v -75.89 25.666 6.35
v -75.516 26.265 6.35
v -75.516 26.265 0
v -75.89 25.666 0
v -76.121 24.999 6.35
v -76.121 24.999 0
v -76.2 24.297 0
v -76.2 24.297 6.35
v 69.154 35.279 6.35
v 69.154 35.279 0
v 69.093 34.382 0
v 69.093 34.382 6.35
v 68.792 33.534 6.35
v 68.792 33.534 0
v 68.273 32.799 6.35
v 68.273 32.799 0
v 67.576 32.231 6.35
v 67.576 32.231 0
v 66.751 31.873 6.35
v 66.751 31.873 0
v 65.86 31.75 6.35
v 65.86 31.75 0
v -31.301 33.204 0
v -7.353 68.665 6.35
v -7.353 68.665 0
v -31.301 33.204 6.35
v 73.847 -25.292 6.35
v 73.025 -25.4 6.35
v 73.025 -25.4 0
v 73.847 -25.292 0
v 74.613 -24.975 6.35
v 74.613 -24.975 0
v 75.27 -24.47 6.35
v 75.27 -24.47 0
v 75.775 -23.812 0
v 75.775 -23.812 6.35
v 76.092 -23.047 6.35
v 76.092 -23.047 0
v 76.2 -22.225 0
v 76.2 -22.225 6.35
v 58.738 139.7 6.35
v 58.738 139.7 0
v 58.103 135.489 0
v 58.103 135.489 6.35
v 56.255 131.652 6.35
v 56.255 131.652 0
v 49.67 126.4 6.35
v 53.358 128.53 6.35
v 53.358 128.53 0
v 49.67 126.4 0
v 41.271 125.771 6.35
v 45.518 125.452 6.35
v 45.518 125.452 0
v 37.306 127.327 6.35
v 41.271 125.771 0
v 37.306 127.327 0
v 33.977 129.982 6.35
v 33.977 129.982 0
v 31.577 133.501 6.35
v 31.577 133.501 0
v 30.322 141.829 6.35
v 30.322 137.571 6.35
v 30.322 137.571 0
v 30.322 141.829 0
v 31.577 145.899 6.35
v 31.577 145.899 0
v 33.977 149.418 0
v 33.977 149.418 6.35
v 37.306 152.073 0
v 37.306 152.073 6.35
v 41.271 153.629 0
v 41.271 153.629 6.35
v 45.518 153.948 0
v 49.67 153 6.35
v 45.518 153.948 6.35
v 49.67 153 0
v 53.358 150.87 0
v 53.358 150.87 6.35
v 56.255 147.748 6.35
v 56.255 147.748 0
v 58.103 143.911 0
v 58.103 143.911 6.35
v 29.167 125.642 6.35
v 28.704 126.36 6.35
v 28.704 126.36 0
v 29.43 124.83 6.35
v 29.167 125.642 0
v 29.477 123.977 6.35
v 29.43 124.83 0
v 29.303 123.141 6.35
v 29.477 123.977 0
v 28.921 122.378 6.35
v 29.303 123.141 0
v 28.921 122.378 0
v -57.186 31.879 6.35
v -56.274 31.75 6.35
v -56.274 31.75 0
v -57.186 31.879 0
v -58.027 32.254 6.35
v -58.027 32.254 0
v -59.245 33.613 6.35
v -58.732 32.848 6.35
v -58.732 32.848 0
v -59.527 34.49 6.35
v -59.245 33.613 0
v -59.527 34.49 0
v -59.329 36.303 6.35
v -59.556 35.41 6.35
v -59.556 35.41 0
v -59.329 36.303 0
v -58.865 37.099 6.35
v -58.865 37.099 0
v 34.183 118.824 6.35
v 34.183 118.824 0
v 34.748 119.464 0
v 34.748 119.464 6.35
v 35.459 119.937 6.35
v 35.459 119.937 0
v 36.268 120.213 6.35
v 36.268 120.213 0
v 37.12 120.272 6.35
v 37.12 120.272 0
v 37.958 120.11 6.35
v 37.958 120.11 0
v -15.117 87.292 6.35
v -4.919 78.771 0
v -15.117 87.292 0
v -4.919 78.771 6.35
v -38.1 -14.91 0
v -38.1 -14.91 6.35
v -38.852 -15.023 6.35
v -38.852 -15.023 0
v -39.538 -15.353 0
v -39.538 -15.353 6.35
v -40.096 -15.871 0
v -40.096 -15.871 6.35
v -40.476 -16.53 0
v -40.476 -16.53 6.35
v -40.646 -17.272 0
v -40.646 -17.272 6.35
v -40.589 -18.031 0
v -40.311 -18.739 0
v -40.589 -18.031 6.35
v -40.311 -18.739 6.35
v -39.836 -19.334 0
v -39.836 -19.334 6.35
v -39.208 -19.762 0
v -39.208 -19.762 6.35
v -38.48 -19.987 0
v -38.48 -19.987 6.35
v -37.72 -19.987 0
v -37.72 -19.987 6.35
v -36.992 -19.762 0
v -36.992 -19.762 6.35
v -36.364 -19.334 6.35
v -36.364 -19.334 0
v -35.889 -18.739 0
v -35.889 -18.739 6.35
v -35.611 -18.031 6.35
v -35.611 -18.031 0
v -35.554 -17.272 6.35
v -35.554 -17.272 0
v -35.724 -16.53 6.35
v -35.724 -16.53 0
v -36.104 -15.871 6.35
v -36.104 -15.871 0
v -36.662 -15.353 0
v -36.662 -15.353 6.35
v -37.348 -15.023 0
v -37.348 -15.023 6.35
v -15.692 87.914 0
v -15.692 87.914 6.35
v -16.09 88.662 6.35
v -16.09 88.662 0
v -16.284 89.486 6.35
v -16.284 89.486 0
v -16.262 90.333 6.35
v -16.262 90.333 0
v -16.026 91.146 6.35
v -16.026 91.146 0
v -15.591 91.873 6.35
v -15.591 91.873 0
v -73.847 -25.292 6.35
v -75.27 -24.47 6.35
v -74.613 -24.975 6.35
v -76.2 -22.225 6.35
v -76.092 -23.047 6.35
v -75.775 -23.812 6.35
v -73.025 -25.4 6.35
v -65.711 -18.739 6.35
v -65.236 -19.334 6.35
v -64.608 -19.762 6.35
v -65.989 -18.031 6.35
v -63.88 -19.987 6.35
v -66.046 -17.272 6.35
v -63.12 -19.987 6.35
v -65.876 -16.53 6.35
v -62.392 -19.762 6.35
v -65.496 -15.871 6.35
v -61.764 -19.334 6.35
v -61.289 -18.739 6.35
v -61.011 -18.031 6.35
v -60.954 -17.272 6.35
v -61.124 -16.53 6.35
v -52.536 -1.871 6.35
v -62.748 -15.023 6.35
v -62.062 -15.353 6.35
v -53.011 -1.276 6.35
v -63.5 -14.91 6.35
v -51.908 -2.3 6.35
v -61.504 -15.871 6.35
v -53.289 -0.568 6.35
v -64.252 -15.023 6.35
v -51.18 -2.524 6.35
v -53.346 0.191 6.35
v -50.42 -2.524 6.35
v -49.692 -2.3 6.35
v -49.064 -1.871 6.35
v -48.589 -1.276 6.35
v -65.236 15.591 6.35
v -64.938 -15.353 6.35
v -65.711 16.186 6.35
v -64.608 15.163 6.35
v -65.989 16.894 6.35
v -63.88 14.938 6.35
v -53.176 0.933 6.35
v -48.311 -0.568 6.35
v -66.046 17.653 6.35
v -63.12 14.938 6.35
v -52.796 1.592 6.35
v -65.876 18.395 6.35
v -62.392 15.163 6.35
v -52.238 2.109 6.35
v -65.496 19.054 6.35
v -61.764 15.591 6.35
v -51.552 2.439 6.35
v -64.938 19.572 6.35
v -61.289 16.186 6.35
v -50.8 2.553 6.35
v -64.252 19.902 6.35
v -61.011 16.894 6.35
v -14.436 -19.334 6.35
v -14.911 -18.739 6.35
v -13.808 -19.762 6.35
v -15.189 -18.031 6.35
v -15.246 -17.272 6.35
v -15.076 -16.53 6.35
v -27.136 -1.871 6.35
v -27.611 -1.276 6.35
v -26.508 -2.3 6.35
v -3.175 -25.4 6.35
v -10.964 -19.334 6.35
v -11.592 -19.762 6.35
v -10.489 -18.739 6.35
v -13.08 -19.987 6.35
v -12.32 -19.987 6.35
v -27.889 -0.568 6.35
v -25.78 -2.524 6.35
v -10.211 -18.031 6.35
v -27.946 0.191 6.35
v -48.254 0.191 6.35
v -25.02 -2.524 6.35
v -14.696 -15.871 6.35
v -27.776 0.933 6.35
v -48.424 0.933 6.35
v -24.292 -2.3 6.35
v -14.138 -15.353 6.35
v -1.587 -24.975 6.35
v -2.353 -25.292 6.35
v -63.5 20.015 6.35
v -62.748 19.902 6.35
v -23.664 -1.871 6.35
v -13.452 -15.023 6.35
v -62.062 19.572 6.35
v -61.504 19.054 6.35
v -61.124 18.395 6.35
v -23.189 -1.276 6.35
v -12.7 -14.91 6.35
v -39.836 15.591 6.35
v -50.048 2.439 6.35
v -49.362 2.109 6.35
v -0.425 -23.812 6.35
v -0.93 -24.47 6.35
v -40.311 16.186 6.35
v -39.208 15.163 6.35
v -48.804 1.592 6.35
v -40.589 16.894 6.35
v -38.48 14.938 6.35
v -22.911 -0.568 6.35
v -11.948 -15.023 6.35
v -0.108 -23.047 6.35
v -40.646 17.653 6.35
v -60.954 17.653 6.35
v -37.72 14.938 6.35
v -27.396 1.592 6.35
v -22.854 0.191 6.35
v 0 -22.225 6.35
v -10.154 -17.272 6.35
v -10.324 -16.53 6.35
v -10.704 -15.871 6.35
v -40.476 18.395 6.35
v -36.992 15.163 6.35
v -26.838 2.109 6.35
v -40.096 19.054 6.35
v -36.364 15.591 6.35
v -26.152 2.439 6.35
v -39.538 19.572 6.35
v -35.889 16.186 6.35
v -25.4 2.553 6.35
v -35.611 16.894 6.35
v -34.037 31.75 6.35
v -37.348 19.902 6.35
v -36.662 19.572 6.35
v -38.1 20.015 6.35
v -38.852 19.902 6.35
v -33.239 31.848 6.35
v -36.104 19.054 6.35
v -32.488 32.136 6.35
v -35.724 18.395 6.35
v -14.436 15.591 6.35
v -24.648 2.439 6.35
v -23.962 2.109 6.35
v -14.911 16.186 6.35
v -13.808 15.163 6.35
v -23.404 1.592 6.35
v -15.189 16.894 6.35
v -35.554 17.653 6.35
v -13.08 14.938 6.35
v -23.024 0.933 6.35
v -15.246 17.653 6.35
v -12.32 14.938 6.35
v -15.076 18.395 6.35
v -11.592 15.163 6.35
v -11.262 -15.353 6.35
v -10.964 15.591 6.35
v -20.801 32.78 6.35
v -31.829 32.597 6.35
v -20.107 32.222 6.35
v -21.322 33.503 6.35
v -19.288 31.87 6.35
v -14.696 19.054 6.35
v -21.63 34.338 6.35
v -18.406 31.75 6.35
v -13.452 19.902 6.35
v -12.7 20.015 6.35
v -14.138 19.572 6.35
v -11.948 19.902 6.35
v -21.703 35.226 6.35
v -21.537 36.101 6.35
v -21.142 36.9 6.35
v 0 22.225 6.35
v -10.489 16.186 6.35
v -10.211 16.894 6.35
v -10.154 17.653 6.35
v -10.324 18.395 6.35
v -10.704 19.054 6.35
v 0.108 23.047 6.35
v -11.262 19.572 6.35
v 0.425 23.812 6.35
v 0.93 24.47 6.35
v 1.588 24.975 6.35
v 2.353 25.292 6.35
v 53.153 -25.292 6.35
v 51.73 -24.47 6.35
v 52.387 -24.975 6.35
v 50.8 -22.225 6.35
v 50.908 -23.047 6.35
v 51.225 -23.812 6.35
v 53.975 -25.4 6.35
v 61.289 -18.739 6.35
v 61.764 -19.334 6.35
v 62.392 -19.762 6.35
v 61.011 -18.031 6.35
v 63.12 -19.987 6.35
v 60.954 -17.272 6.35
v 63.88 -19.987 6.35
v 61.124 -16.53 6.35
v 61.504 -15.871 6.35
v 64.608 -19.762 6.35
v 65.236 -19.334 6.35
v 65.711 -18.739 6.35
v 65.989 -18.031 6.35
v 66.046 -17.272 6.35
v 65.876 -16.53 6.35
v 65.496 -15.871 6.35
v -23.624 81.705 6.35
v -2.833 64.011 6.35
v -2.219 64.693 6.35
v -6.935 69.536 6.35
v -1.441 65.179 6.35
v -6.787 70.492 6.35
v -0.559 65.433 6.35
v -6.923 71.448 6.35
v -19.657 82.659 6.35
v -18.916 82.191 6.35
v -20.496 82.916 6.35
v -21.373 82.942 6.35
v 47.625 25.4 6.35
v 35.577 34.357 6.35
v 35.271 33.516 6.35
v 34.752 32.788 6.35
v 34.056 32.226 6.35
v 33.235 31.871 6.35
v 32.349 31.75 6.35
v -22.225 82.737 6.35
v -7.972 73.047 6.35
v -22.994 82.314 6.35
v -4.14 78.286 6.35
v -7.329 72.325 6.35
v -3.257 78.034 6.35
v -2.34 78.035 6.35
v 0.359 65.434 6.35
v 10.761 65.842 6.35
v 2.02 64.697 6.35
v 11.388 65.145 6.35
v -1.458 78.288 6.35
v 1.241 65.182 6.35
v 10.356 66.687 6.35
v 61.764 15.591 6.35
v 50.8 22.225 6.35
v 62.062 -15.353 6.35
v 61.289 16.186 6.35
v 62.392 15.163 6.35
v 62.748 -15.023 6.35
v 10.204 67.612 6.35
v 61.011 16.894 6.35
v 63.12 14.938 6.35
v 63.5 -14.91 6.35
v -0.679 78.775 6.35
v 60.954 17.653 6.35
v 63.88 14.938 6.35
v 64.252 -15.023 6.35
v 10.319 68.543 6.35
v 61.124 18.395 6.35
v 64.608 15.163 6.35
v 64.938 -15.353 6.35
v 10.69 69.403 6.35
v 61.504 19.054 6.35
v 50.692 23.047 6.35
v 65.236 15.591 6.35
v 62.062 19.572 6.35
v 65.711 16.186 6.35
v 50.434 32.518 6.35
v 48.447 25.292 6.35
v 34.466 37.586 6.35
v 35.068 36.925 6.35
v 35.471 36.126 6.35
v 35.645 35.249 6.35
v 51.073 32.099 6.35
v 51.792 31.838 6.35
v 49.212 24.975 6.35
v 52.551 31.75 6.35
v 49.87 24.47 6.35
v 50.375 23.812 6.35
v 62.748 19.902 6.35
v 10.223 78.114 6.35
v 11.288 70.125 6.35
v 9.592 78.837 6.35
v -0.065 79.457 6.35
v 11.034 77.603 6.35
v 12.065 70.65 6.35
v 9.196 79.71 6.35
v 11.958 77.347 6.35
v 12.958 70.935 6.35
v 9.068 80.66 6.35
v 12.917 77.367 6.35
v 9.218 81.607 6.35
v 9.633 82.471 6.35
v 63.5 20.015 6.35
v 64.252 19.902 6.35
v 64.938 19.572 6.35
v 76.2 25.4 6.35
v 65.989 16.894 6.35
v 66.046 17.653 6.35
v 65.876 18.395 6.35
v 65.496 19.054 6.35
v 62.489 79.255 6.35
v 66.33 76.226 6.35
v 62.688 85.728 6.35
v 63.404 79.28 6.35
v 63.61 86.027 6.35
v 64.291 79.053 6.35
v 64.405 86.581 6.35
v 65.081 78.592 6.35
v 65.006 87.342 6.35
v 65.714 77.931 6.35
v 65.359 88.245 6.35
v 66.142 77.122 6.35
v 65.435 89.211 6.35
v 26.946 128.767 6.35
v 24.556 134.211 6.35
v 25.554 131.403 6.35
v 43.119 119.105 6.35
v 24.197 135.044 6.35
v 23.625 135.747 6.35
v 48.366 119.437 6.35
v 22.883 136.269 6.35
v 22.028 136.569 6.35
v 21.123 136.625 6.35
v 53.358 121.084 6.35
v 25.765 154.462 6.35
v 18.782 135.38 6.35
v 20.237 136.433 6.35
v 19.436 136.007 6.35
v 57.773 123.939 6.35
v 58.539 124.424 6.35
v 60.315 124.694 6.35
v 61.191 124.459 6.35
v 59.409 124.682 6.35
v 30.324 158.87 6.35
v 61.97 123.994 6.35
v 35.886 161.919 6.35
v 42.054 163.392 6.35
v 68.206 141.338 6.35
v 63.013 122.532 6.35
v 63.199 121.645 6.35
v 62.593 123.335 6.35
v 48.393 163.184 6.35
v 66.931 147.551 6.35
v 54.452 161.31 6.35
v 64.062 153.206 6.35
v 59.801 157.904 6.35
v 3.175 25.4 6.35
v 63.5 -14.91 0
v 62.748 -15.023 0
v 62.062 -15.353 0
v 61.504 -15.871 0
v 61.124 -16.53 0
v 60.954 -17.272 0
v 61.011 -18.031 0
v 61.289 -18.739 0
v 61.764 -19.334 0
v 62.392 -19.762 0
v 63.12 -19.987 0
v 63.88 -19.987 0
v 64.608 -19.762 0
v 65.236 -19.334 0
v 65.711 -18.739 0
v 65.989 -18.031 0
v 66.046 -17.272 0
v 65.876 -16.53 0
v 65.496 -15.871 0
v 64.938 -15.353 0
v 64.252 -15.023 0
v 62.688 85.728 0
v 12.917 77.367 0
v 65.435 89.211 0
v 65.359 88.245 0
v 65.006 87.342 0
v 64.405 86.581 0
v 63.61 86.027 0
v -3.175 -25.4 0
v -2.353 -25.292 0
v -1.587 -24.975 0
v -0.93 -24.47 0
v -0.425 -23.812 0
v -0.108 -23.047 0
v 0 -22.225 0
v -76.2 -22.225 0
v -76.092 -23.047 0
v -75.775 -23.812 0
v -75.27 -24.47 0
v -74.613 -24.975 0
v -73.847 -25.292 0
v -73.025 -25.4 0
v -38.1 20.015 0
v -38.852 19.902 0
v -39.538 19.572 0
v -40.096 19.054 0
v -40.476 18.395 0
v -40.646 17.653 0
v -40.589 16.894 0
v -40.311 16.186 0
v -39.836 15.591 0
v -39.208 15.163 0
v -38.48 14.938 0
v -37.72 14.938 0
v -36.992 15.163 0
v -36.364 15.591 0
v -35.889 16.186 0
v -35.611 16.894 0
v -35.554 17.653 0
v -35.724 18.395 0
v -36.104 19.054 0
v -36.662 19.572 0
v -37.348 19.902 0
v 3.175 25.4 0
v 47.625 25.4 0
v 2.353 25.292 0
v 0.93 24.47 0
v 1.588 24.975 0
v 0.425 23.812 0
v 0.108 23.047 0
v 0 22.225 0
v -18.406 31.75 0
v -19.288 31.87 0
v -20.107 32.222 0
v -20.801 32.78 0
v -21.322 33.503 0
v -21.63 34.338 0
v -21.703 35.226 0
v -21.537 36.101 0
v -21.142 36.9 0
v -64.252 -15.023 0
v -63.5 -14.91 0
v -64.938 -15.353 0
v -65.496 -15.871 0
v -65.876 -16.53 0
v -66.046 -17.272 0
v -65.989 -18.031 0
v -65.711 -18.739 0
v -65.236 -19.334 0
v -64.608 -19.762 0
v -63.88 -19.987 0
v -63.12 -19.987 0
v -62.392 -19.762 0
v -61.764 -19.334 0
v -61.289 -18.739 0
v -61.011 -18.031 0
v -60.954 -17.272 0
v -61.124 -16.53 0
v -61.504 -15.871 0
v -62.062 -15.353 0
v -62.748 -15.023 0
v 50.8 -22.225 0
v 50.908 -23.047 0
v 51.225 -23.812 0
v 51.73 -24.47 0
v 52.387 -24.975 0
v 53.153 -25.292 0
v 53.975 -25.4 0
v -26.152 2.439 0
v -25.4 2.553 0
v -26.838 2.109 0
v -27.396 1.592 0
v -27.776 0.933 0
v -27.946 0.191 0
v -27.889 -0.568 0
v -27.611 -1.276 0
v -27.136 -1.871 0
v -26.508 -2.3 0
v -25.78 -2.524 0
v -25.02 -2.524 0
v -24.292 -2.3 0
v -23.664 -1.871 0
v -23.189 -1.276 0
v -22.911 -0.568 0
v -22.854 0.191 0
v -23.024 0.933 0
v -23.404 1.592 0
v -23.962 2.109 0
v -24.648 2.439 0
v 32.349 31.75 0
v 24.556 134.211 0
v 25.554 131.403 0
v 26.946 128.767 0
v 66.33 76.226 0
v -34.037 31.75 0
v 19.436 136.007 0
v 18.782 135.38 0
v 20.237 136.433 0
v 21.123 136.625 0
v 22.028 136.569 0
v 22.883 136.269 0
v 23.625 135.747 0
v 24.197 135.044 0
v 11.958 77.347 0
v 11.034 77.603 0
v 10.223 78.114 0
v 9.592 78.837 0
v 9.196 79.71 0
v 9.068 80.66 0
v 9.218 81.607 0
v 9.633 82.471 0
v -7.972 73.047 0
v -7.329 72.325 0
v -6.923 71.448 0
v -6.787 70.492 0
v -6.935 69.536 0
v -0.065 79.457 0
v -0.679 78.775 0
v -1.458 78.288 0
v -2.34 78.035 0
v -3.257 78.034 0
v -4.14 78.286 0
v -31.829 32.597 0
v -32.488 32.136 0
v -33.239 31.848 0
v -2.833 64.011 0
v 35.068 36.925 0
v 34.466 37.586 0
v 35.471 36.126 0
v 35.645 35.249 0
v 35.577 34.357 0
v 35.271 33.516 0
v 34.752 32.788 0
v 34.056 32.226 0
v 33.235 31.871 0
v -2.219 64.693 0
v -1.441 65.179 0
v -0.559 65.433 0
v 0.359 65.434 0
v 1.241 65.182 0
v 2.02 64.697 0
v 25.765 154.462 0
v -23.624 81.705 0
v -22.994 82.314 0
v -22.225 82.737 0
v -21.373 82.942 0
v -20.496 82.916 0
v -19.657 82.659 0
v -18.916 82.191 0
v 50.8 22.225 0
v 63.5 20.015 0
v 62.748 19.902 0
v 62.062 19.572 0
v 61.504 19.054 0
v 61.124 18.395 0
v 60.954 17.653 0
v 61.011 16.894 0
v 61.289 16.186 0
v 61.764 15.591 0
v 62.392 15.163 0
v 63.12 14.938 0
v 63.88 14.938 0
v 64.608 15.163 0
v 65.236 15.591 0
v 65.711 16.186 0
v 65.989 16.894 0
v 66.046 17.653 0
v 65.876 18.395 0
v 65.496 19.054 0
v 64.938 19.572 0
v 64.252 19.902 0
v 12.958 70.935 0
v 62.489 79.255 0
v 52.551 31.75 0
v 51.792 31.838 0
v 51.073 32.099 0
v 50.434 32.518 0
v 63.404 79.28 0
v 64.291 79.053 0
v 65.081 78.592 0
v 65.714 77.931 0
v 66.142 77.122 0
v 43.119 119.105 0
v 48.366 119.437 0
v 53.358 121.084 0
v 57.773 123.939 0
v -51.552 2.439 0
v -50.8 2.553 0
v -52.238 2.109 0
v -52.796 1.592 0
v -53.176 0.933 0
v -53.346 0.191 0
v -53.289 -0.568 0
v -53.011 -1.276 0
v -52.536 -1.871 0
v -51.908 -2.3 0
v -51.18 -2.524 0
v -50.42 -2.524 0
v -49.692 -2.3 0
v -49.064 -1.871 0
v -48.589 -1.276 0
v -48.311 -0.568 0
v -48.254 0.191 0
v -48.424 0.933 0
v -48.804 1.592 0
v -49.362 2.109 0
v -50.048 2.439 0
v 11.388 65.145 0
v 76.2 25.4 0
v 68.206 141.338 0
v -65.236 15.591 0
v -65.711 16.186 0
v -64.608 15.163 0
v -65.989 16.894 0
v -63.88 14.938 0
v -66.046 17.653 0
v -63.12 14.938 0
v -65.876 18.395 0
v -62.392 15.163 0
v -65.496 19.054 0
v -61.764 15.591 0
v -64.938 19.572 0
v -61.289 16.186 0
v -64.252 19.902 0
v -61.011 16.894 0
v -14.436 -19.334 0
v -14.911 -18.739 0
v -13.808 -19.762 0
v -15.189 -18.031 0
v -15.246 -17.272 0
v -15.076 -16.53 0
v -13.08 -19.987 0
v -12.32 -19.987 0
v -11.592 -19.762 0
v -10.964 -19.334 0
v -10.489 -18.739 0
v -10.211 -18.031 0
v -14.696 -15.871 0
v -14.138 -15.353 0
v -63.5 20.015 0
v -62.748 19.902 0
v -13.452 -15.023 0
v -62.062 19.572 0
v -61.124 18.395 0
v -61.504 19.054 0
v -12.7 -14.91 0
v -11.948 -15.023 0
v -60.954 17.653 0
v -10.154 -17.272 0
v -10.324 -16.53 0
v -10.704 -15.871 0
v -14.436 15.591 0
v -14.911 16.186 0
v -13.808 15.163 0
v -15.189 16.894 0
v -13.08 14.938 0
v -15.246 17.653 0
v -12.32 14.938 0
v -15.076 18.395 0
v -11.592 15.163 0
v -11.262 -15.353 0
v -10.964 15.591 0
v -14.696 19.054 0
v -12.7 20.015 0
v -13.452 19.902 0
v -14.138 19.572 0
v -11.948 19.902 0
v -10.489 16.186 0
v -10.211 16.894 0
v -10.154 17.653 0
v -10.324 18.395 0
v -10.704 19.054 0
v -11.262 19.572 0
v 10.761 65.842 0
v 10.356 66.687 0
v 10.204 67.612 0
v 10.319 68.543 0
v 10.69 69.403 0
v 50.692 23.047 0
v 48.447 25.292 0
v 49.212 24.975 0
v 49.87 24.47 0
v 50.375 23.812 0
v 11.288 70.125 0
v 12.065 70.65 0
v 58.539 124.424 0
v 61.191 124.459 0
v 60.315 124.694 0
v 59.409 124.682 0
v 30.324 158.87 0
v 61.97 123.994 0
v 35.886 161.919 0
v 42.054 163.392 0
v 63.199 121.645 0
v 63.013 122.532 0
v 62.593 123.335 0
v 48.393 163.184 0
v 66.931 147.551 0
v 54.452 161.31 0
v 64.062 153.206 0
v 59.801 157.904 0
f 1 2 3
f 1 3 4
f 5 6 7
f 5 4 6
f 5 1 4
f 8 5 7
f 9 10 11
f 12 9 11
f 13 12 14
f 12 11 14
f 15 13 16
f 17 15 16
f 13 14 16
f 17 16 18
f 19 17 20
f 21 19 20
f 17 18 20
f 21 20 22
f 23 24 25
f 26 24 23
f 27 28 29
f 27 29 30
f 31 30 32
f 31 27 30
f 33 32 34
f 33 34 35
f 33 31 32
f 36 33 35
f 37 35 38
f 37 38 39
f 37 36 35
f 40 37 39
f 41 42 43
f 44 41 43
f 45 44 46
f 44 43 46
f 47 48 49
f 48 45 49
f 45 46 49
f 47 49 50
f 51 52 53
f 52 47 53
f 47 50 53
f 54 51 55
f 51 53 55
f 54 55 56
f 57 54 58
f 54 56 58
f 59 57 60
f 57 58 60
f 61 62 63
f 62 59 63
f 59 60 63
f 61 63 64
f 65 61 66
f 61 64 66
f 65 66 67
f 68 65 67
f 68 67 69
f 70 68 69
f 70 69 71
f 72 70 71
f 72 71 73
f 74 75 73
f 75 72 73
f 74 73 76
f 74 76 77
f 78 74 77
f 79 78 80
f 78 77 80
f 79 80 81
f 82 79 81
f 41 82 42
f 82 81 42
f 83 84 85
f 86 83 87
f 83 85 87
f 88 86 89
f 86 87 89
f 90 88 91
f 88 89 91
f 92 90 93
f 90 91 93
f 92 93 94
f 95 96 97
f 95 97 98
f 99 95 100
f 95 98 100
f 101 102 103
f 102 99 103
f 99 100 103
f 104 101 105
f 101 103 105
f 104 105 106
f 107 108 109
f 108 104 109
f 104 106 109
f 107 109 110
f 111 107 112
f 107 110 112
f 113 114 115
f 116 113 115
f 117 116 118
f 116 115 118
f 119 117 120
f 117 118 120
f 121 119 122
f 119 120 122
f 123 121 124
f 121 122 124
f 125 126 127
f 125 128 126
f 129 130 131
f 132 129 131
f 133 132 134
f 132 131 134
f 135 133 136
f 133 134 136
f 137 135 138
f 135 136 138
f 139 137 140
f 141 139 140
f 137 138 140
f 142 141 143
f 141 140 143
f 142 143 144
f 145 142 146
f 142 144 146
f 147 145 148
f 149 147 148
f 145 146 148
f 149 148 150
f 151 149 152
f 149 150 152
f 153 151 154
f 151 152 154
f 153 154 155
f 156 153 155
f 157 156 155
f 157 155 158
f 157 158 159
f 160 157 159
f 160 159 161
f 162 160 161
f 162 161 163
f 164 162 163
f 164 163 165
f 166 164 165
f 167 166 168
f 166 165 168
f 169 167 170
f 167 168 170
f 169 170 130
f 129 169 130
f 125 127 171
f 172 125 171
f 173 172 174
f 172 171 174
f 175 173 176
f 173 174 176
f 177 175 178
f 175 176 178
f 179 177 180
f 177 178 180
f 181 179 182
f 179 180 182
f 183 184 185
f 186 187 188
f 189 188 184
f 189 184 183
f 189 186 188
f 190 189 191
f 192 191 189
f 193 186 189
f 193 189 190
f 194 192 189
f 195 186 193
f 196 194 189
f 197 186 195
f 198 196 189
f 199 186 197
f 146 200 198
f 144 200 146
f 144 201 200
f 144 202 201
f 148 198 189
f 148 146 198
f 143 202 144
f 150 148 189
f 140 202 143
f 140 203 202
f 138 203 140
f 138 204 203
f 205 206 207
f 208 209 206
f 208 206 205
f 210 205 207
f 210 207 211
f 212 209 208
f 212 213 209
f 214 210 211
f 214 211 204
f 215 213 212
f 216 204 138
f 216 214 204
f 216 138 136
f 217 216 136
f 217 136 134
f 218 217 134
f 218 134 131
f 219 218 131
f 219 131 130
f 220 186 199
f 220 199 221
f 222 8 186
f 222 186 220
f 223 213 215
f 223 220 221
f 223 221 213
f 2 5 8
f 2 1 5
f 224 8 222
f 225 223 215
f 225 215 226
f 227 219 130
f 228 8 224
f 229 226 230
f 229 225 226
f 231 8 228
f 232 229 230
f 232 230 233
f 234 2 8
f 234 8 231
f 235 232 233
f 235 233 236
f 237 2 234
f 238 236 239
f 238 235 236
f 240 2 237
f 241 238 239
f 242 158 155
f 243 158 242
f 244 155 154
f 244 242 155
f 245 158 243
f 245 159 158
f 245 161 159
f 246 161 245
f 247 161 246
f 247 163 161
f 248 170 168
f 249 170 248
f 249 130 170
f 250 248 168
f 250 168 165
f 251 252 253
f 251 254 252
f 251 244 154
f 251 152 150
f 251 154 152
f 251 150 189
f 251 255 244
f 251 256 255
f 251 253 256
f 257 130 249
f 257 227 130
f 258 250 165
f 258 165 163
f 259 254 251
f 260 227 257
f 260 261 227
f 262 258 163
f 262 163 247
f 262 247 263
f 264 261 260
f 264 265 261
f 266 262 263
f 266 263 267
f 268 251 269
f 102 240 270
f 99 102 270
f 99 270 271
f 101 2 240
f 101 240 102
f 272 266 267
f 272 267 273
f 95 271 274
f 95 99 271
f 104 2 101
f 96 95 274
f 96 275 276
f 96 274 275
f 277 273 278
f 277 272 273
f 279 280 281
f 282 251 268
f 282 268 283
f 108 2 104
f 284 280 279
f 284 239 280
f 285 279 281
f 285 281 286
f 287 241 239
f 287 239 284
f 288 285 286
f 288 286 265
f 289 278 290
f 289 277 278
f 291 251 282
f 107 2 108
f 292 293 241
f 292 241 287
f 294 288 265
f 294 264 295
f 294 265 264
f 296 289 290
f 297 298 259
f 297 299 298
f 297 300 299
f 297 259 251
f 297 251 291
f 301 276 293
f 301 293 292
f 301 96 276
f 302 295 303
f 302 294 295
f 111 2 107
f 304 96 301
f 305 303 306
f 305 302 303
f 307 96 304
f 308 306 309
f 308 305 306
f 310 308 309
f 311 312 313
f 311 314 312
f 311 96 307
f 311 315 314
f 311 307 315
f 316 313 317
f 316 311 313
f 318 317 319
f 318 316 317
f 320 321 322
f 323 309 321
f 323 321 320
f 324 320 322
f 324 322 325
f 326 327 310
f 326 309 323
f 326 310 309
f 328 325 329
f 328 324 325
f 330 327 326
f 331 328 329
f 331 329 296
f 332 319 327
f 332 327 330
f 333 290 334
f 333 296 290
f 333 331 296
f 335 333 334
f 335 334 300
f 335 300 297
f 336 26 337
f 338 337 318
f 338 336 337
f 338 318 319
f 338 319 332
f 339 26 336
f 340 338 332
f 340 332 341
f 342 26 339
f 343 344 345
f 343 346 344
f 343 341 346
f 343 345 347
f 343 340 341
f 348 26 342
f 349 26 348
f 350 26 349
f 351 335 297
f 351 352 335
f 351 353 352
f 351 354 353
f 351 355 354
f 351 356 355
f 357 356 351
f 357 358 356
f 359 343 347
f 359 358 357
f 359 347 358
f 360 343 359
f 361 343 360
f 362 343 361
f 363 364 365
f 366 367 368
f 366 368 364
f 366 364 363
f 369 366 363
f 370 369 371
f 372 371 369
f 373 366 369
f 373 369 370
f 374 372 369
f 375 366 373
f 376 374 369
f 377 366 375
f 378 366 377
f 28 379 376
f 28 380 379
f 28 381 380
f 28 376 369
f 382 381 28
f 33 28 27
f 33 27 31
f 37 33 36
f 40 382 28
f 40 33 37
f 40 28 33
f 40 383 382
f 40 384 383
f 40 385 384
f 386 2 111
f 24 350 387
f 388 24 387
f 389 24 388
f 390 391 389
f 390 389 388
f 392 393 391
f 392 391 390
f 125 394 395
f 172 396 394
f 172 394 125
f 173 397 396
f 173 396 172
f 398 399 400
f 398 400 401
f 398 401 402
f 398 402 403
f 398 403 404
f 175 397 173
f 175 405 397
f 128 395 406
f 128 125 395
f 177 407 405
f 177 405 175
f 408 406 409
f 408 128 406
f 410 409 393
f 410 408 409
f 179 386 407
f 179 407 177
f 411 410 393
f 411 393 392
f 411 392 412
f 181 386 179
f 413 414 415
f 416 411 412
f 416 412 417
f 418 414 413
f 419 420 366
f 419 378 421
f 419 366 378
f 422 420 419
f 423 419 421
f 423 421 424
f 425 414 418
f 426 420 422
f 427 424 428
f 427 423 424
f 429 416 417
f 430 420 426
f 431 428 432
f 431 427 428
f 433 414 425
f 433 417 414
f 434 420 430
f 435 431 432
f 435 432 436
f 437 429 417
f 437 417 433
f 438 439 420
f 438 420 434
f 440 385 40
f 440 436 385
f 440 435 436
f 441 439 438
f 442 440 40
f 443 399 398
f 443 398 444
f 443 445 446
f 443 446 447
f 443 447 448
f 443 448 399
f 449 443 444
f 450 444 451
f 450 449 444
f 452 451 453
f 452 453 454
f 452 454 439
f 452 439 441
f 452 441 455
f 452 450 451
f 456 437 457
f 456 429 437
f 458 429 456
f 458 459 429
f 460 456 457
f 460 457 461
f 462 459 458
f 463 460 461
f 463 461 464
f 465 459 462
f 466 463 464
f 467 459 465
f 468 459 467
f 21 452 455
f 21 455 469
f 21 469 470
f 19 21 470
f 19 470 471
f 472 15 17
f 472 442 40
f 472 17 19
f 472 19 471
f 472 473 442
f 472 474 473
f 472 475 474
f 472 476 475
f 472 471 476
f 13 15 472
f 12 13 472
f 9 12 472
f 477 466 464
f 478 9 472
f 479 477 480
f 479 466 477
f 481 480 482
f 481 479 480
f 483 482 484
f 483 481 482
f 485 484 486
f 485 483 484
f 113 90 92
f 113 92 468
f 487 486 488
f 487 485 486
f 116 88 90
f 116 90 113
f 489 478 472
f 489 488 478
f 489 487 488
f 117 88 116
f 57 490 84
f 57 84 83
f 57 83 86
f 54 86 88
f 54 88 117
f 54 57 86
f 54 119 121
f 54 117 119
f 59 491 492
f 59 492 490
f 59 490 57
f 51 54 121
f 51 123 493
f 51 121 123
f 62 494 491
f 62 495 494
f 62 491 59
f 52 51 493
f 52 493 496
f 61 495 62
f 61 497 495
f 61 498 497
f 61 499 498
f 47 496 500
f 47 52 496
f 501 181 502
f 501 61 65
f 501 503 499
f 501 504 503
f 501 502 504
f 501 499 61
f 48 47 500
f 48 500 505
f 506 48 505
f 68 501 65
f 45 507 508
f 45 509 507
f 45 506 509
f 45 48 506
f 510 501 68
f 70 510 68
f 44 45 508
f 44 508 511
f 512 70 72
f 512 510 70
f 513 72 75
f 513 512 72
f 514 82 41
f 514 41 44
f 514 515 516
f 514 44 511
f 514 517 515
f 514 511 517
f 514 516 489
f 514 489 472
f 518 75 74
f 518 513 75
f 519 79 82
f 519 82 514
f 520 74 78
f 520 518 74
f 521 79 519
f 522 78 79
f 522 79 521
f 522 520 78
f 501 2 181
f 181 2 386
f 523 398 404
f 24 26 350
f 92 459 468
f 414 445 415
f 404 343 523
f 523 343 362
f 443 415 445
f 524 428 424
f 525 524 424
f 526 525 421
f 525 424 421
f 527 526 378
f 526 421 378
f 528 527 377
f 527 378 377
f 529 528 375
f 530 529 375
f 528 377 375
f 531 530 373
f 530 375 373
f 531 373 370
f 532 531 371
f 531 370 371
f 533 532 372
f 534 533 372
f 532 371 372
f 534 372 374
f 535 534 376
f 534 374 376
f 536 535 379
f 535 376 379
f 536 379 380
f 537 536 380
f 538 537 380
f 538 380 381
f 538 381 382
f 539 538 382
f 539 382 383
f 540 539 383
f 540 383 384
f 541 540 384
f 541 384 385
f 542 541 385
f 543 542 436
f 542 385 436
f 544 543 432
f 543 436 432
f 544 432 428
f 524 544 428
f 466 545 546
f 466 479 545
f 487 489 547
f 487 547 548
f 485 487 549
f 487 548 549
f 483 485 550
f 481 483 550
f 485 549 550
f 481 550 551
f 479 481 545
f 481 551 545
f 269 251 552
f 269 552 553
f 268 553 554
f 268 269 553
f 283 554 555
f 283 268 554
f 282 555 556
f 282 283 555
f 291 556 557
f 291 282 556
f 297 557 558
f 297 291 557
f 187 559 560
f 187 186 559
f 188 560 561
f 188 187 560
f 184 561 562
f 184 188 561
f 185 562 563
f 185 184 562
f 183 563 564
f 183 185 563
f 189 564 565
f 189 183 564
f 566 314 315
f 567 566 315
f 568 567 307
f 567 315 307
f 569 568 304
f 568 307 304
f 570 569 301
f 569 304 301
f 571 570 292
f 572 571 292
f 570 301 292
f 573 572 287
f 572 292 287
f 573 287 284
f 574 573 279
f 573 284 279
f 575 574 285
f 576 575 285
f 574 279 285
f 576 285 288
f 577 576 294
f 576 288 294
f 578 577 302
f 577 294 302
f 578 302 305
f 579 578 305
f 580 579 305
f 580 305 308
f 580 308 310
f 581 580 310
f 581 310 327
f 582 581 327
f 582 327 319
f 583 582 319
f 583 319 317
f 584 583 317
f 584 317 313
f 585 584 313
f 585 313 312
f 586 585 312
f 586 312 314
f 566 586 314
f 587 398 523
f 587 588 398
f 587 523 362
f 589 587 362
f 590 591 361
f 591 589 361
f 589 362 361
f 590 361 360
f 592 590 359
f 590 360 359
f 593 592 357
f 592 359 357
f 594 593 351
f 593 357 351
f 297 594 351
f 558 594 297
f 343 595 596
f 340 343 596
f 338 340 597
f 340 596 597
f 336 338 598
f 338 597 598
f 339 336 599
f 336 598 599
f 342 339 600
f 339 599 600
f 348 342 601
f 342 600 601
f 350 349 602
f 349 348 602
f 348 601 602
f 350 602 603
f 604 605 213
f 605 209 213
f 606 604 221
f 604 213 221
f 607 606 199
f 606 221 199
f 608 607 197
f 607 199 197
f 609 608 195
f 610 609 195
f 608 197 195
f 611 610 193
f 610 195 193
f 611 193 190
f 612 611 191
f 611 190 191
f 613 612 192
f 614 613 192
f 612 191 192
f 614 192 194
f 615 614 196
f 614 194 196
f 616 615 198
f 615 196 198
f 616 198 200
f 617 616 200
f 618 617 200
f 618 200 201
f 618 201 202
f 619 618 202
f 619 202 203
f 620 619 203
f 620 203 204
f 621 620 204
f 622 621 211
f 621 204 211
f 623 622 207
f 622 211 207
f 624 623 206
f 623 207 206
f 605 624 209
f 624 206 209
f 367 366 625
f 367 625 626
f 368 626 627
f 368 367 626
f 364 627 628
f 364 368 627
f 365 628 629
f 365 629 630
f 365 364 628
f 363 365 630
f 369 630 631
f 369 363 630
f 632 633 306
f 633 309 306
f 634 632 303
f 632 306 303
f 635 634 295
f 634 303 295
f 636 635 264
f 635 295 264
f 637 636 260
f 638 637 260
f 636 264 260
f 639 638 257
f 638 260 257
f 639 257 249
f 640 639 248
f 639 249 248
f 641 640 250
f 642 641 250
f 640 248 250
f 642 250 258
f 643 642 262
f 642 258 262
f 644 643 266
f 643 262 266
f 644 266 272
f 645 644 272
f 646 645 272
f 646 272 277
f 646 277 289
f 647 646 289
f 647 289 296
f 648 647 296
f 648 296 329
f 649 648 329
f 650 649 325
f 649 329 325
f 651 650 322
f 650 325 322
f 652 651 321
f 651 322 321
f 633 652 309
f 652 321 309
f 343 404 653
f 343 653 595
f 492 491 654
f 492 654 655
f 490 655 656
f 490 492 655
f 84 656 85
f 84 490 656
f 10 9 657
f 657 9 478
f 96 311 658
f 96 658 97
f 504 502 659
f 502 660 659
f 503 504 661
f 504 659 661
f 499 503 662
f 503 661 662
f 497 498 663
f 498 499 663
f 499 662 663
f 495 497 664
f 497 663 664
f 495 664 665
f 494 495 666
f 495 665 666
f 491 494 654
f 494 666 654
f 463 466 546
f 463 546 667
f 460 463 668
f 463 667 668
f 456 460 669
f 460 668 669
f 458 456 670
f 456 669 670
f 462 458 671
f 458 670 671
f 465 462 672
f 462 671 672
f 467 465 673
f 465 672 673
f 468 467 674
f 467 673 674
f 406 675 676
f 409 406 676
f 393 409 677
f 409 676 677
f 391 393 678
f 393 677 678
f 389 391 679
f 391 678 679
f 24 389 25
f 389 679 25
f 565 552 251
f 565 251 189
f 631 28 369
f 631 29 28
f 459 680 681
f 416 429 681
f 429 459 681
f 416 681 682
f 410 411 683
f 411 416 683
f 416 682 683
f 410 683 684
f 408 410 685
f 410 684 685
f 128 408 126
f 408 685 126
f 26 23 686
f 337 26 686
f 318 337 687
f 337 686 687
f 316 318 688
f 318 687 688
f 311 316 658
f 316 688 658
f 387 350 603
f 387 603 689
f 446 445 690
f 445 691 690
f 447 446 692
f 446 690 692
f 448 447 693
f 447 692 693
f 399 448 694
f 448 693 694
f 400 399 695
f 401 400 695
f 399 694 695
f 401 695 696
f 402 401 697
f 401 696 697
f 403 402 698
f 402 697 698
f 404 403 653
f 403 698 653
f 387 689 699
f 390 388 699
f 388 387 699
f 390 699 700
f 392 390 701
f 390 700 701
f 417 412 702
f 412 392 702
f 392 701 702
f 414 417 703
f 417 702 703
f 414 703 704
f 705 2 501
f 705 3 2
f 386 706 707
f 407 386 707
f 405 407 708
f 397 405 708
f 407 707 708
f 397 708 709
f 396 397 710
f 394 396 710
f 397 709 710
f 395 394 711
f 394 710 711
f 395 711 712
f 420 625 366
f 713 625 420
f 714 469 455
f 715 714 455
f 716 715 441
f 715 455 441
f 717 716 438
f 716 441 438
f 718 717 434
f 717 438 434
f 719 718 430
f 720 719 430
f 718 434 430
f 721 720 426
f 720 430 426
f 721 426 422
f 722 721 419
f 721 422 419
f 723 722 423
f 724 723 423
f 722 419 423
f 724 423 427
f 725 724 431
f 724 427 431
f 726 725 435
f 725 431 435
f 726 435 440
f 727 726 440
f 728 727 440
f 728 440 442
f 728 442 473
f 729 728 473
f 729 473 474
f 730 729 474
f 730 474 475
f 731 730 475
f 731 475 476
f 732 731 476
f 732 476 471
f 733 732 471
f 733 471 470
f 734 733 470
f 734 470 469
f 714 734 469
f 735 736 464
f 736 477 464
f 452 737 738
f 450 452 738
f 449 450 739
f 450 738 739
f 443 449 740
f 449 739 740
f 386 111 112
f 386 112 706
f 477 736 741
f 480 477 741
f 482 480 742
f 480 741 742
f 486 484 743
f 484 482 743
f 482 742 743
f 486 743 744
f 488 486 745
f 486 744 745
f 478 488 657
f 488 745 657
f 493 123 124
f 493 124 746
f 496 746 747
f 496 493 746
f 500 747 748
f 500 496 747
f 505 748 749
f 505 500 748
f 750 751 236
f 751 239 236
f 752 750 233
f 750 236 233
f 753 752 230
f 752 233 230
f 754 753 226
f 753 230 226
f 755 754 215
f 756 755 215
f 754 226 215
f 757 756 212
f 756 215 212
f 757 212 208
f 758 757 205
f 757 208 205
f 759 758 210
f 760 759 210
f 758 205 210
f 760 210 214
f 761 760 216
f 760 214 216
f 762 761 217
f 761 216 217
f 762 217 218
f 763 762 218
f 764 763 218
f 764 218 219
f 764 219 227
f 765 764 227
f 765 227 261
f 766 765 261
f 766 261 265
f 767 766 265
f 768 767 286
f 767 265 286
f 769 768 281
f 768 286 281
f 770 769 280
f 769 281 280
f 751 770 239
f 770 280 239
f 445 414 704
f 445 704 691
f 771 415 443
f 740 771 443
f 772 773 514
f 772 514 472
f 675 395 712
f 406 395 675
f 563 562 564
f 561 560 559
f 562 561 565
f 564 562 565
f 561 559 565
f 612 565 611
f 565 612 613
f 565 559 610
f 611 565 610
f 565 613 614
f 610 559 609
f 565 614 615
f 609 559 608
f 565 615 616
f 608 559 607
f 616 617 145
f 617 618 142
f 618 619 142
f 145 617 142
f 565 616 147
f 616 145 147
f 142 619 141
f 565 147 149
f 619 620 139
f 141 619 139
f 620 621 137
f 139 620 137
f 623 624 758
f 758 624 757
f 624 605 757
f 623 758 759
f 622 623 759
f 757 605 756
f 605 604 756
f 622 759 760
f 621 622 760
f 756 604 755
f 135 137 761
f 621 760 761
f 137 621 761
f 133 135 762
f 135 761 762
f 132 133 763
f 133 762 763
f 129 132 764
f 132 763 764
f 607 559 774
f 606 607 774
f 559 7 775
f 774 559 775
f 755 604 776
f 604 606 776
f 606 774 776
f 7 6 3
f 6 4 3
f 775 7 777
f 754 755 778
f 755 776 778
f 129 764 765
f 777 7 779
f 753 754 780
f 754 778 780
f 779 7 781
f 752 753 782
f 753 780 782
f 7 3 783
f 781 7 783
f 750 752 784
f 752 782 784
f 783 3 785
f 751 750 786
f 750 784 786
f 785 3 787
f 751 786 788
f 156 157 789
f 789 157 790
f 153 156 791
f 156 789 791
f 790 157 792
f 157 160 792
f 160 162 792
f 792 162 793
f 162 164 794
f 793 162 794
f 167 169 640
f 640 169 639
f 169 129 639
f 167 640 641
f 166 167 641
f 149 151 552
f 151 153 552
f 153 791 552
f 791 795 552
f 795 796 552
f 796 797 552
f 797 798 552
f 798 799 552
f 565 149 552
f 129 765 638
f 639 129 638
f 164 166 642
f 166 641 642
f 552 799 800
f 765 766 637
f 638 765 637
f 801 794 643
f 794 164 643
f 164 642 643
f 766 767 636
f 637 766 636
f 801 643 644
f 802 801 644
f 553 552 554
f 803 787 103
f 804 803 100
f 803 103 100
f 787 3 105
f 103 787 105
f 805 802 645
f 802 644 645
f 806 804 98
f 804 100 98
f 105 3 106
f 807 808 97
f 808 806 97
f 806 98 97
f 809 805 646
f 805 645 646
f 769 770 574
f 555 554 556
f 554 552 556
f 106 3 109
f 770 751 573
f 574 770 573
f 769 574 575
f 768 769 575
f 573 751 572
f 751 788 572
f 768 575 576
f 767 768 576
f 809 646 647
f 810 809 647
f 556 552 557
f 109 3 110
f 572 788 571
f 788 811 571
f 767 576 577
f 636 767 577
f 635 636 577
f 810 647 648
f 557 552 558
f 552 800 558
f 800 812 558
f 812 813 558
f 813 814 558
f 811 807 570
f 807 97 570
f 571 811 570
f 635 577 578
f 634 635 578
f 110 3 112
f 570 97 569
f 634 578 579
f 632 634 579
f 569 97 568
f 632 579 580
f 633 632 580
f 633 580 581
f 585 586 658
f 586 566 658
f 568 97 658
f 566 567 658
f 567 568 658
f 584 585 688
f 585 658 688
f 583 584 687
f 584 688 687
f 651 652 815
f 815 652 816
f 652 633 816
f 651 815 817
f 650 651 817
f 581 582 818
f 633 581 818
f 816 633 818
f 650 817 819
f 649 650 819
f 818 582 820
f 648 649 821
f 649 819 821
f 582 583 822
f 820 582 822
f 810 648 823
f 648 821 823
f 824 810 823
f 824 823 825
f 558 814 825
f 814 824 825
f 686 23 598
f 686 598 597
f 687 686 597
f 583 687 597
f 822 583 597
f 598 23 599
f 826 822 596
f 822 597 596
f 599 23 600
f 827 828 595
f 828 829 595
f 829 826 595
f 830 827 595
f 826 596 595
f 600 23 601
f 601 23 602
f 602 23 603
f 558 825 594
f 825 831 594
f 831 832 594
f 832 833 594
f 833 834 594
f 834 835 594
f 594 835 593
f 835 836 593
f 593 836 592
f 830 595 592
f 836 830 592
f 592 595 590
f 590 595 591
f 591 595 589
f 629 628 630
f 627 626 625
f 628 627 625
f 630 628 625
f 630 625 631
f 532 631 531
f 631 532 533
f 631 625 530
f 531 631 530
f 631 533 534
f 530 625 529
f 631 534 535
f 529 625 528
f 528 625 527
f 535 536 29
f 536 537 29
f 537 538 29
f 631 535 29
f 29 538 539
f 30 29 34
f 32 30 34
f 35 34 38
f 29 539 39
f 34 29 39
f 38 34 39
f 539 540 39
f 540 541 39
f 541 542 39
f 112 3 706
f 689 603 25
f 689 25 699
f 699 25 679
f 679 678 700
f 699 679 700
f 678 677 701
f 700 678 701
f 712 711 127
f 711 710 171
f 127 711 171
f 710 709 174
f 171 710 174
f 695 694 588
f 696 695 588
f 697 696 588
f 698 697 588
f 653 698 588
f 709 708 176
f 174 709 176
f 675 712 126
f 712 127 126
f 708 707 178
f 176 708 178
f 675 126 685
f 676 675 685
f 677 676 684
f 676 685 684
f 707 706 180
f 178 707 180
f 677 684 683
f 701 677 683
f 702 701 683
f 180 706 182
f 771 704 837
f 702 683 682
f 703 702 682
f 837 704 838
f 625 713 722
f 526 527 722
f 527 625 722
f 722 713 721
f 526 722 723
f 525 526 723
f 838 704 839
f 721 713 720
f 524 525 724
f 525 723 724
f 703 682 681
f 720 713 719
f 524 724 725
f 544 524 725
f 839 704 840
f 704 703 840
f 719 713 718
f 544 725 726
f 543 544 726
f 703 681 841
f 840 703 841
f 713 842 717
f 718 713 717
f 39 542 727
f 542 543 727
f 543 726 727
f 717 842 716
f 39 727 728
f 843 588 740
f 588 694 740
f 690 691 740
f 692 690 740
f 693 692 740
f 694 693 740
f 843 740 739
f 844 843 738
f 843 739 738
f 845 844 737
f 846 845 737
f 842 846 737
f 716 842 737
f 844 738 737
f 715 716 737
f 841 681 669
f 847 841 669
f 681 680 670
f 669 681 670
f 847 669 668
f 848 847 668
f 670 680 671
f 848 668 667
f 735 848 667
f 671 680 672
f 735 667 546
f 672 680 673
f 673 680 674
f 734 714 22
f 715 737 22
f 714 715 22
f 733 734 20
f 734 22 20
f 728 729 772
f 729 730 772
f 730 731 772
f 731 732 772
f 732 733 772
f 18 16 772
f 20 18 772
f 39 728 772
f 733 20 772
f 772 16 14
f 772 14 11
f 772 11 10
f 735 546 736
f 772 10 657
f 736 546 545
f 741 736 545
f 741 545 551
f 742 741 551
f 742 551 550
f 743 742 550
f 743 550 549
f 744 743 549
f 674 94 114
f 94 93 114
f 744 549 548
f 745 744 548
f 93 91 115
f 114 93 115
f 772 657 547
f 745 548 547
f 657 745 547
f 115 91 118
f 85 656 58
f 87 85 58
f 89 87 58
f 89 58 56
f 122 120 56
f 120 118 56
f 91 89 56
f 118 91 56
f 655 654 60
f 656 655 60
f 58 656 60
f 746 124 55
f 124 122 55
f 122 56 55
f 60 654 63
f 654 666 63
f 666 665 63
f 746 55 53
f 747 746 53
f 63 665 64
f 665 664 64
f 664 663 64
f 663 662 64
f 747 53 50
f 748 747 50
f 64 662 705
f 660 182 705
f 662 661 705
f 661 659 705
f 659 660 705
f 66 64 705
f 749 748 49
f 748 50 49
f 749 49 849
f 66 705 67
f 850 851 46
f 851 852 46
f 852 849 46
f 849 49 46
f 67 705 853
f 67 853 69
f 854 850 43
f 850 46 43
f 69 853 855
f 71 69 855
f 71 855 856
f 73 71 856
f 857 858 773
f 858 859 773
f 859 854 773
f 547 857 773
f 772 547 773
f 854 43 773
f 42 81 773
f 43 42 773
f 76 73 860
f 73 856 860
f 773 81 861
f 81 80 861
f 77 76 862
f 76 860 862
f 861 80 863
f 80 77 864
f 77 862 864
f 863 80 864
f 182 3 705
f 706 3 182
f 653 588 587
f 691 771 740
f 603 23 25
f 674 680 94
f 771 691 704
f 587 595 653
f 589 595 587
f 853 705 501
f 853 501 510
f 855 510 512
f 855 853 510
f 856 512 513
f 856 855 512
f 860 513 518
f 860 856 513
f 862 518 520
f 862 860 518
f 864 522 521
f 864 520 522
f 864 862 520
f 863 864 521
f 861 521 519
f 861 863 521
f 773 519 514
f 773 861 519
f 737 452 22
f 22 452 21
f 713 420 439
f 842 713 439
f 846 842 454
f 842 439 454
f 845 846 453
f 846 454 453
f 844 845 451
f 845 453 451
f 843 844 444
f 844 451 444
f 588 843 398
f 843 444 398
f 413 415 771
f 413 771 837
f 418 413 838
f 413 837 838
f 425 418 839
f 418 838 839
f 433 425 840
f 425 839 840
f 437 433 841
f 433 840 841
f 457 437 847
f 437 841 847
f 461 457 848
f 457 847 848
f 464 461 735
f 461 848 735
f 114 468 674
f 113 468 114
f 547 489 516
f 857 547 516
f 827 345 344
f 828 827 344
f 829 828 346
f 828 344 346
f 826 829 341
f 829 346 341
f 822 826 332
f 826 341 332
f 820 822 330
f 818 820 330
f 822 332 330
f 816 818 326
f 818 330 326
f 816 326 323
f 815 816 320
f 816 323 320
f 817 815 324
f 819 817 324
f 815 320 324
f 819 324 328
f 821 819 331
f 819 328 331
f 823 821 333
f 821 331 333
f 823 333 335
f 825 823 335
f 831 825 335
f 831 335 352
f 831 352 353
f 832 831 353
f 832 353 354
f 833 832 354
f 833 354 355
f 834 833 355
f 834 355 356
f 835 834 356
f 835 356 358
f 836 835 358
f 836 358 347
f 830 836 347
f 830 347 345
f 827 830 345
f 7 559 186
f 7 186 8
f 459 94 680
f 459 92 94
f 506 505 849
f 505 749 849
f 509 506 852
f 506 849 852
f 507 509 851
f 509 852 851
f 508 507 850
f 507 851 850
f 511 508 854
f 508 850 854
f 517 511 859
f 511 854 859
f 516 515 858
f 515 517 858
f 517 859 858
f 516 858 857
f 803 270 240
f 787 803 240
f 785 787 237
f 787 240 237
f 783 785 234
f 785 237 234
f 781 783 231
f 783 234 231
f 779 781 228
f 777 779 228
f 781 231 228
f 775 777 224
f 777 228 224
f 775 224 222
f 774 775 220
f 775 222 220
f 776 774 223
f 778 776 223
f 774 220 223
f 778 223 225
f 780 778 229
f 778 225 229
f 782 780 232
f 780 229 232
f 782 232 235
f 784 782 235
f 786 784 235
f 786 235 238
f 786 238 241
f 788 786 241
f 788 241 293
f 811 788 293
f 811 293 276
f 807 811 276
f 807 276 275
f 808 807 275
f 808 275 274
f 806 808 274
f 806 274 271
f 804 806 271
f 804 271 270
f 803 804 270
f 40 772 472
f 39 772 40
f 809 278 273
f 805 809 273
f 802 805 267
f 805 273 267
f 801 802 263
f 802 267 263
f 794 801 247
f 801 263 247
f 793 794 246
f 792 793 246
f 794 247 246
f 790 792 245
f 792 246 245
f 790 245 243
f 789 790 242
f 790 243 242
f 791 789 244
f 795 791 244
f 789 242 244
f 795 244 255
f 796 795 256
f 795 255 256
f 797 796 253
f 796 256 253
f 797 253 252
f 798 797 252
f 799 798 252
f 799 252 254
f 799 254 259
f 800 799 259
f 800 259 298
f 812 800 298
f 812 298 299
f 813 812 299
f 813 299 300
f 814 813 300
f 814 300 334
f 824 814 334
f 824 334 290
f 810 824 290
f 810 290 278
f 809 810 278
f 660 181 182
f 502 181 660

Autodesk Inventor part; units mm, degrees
ref_plane "YZ Plane" through (0, 0, 0) normal (1, 0, 0) x (0, 1, 0)
ref_plane "XZ Plane" through (0, 0, 0) normal (0, 1, 0) x (-1, 0, 0)
ref_plane "XY Plane" through (0, 0, 0) normal (0, 0, 1) x (1, 0, 0)
sketch "Sketch1" plane through (0, 0, 0) normal (0, 0, 1) x (1, 0, 0)
  line L0 (-76.2, 25.4) -> (76.2, 25.4) construction
  line L1 (76.2, 25.4) -> (76.2, -25.4) construction
  line L2 (76.2, -25.4) -> (-76.2, -25.4) construction
  line L3 (-76.2, -25.4) -> (-76.2, 25.4) construction
  line L4 (-76.2, 25.4) -> (76.2, -25.4) construction
  line L5 (76.2, 25.4) -> (-76.2, -25.4) construction
  line L6 (63.5, 17.4625) -> (63.5, -17.4625) construction
  line L7 (9.525, 15.875) -> (41.275, 15.875) construction
  line L8 (41.275, 15.875) -> (41.275, -15.875) construction
  line L9 (41.275, -15.875) -> (9.525, -15.875) construction
  line L10 (9.525, -15.875) -> (9.525, 15.875) construction
  line L11 (9.525, 15.875) -> (41.275, -15.875) construction
  line L12 (41.275, 15.875) -> (9.525, -15.875) construction
  line L13 (76.2, 101.6) -> (187.452, 101.6) construction
  line L14 (187.452, 101.6) -> (187.452, -25.4) construction
  line L15 (187.452, -25.4) -> (76.2, -25.4) construction
  line L16 (76.2, -25.4) -> (76.2, 101.6) construction
  line L17 (76.2, 101.6) -> (187.452, -25.4) construction
  line L18 (187.452, 101.6) -> (76.2, -25.4) construction
  point P0 (0, 0)
  point P1 (63.5, 0)
  point P2 (25.4, 0)
  point P3 (50.8, 0)
  point P4 (0, 0)
  point P5 (9.525, 0)
  point P6 (-12.7, 17.4625)
  point P7 (-12.7, -17.4625)
  point P8 (-25.4, 0)
  point P9 (-38.1, 17.4625)
  point P10 (-38.1, -17.4625)
  point P11 (-50.8, 0)
  point P12 (-63.5, 17.4625)
  point P13 (-63.5, -17.4625)
  point P14 (131.826, 38.1)
  dimension "d0" = 152.4
  dimension "d1" = 50.8
  dimension "d2" = 34.925
  dimension "d3" = 12.7
  dimension "d4" = 31.75
  dimension "d5" = 31.75
  dimension "d6" = 34.925
  dimension "d7" = 25.4
  dimension "d8" = 9.525
  dimension "d9" = 12.7
  dimension "d10" = 12.7
  dimension "d11" = 12.7
  dimension "d12" = 12.7
  dimension "d13" = 12.7
  dimension "d14" = 111.252
  dimension "d15" = 127
  dimension "d16" = 76.2
sketch "Sketch2" plane through (0, 0, 0) normal (0, 0, 1) x (1, 0, 0)
  line L0 (63.5, 17.4625) -> (63.5, -17.4625) construction
  line L1 (76.2, 25.4) -> (76.2, -25.4) construction
  line L2 (76.2, -25.4) -> (76.2, 101.6) construction
  line L3 (187.452, -25.4) -> (76.2, -25.4) construction
  line L4 (187.452, 101.6) -> (187.452, -25.4) construction
  line L5 (76.2, 101.6) -> (187.452, -25.4) construction
  line L6 (187.452, 101.6) -> (76.2, -25.4) construction
  line L7 (76.2, 101.6) -> (187.452, 101.6) construction
  line L8 (9.525, 15.875) -> (41.275, 15.875) construction
  line L9 (41.275, 15.875) -> (41.275, -15.875) construction
  line L10 (41.275, -15.875) -> (9.525, -15.875) construction
  line L11 (9.525, -15.875) -> (9.525, 15.875) construction
  line L12 (9.525, 15.875) -> (41.275, -15.875) construction
  line L13 (41.275, 15.875) -> (9.525, -15.875) construction
  line L14 (-76.2, 25.4) -> (76.2, 25.4) construction
  line L15 (76.2, -25.4) -> (-76.2, -25.4) construction
  line L16 (-76.2, 25.4) -> (76.2, -25.4) construction
  line L17 (76.2, 25.4) -> (-76.2, -25.4) construction
  line L18 (-76.2, -25.4) -> (-76.2, 25.4) construction
  line L19 (0, 25.4) -> (0, -25.4)
  line L20 (0, -25.4) -> (-76.2, -25.4)
  line L21 (-76.2, -25.4) -> (-76.2, 25.4)
  line L22 (-76.2, 25.4) -> (25.7652, 154.4619)
  circle A0 centre (44.45, 139.7) radius 14.2875
  circle A1 centre (44.45, 139.7) radius 23.8125 construction
  line L23 (68.2061, 141.338) -> (76.2, 25.4)
  line L24 (76.2, 25.4) -> (76.2, -25.4)
  line L25 (76.2, -25.4) -> (50.8, -25.4)
  line L26 (50.8, -25.4) -> (50.8, 25.4)
  line L27 (50.8, 25.4) -> (0, 25.4)
  arc A2 (68.2061, 141.338) -> (25.7652, 154.4619) centre (44.45, 139.7) ccw
  point P0 (0, 0)
  point P1 (63.5, 0)
  point P2 (131.826, 38.1)
  point P3 (9.525, 0)
  point P4 (0, 0)
  point P5 (25.4, 0)
  point P6 (-63.5, -17.4625)
  point P7 (-63.5, 17.4625)
  point P8 (-50.8, 0)
  point P9 (-38.1, -17.4625)
  point P10 (-38.1, 17.4625)
  point P11 (-25.4, 0)
  point P12 (-12.7, -17.4625)
  point P13 (-12.7, 17.4625)
  point P14 (0, 0)
  point P15 (50.8, 0)
  point P16 (0, 0)
  dimension "d17" = 28.575
  dimension "d18" = 9.525
  dimension "d20" = 9.525
  dimension "d21" = 9.525
  dimension "d31" = 165.1
  dimension "d32" = 19.05
extrude "Extrusion1" add sketch "Sketch2" along normal blind 6.35
hole "Hole1" at (76.2, 101.6, 0) at (131.826, 38.1, 0) at (187.452, -25.4, 0) at (9.525, 0, 0) at (9.525, 15.875, 0) at (41.275, -15.875, 0) at (41.275, 15.875, 0) at (9.525, -15.875, 0) at (25.4, 0, 0) at (-63.5, -17.4625, 0) at (-63.5, 17.4625, 0) at (-50.8, 0, 0) at (-38.1, -17.4625, 0) at (-38.1, 17.4625, 0) at (-25.4, 0, 0) at (-12.7, -17.4625, 0) at (-12.7, 17.4625, 0) at (63.5, 17.4625, 0) at (63.5, -17.4625, 0) direction (0, 0, 1) diameter 5.1054 end through all clearance for "Flat Head Machine Screw (82)" size "#10" standard "Ansi Unified Screw Threads"
fillet "Fillet1" radius 3.175 7 edges at (50.8, 25.4, 3.175) (0, 25.4, 3.175) (0, -25.4, 3.175) (50.8, -25.4, 3.175) (76.2, -25.4, 3.175) (-76.2, -25.4, 3.175) (-76.2, 25.4, 3.175)
sketch "Sketch3" plane through (0, 0, 6.35) normal (0, 0, 1) x (1, 0, 0)
  circle A0 centre (63.5, 17.4625) radius 2.5527 construction
  circle A1 centre (-12.7, -17.4625) radius 2.5527 construction
  circle A2 centre (-38.1, 17.4625) radius 2.5527 construction
  circle A3 centre (-50.8, 0) radius 2.5527 construction
  circle A4 centre (-63.5, -17.4625) radius 2.5527 construction
  circle A5 centre (-63.5, 17.4625) radius 2.5527 construction
  circle A6 centre (-38.1, -17.4625) radius 2.5527 construction
  circle A7 centre (-25.4, 0) radius 2.5527 construction
  circle A8 centre (-12.7, 17.4625) radius 2.5527 construction
  circle A9 centre (63.5, -17.4625) radius 2.5527 construction
  circle A10 centre (44.45, 139.7) radius 14.2875 construction
  arc A11 (68.2061, 141.338) -> (25.7652, 154.4619) centre (44.45, 139.7) ccw construction
  line L0 (68.2061, 141.338) -> (76.2, 25.4) construction
  line L1 (76.2, 25.4) -> (76.2, -22.225) construction
  arc A12 (73.025, -25.4) -> (76.2, -22.225) centre (73.025, -22.225) ccw construction
  line L2 (73.025, -25.4) -> (53.975, -25.4) construction
  arc A13 (50.8, -22.225) -> (53.975, -25.4) centre (53.975, -22.225) ccw construction
  line L3 (50.8, -22.225) -> (50.8, 22.225) construction
  arc A14 (50.8, 22.225) -> (47.625, 25.4) centre (47.625, 22.225) ccw construction
  line L4 (47.625, 25.4) -> (3.175, 25.4) construction
  arc A15 (3.175, 25.4) -> (0, 22.225) centre (3.175, 22.225) ccw construction
  line L5 (0, 22.225) -> (0, -22.225) construction
  arc A16 (-3.175, -25.4) -> (0, -22.225) centre (-3.175, -22.225) ccw construction
  line L6 (-3.175, -25.4) -> (-73.025, -25.4) construction
  arc A17 (-76.2, -22.225) -> (-73.025, -25.4) centre (-73.025, -22.225) ccw construction
  line L7 (-76.2, -22.225) -> (-76.2, 24.2971) construction
  arc A18 (-75.5163, 26.2654) -> (-76.2, 24.2971) centre (-73.025, 24.2971) ccw construction
  line L8 (-75.5163, 26.2654) -> (25.7652, 154.4619) construction
  circle A19 centre (44.45, 139.7) radius 20.6375 construction
  line L9 (69.85, 25.1813) -> (61.8711, 140.9012) construction
  arc A20 (61.8711, 140.9012) -> (30.7478, 150.5254) centre (44.45, 139.7) ccw construction
  line L10 (30.7478, 150.5254) -> (-69.85, 23.1943) construction
  line L11 (-69.85, 23.1943) -> (-69.85, -19.05) construction
  line L12 (-69.85, -19.05) -> (-6.35, -19.05) construction
  line L13 (-6.35, -19.05) -> (-6.35, 22.225) construction
  arc A21 (3.175, 31.75) -> (-6.35, 22.225) centre (3.175, 22.225) ccw construction
  line L14 (3.175, 31.75) -> (47.625, 31.75) construction
  arc A22 (57.15, 22.225) -> (47.625, 31.75) centre (47.625, 22.225) ccw construction
  line L15 (57.15, 22.225) -> (57.15, -19.05) construction
  line L16 (57.15, -19.05) -> (69.85, -19.05) construction
  line L17 (69.85, -19.05) -> (69.85, 25.1813) construction
  line L18 (3.175, 31.75) -> (-63.0905, 31.75) construction
  line L19 (47.625, 31.75) -> (69.3971, 31.75) construction
  circle A23 centre (-38.1, 17.4625) radius 2.5527 construction
  line L20 (-38.1, 17.4625) -> (44.45, 139.7) construction
  circle A24 centre (63.5, 17.4625) radius 2.5527 construction
  line L21 (63.5, 17.4625) -> (-19.5511, 86.8598) construction
  line L22 (65.8606, 83.0413) -> (-1.4492, 71.7339) construction
  line L23 (65.6411, 86.2239) -> (5.3247, 76.0913) construction
  line L24 (-24.6201, 31.75) -> (58.4936, 154.8223) construction
  line L25 (-32.2825, 31.75) -> (30.4064, 124.5777) construction
  line L26 (41.4499, 31.75) -> (-21.5201, 84.3676) construction
  line L27 (51.353, 31.75) -> (-17.5821, 89.3521) construction
  line L28 (66.08, 79.8586) -> (5.8815, 69.7459) construction
  line L29 (65.6411, 86.2239) -> (5.3247, 76.0913)
  line L30 (5.3247, 76.0913) -> (35.6688, 121.0239)
  line L31 (65.6411, 86.2239) -> (62.6277, 129.9287)
  arc A25 (35.6688, 121.0239) -> (62.6277, 129.9287) centre (44.45, 139.7) ccw
  line L32 (66.08, 79.8586) -> (5.8815, 69.7459)
  line L33 (5.8815, 69.7459) -> (51.353, 31.75)
  line L34 (51.353, 31.75) -> (69.3971, 31.75)
  line L35 (69.3971, 31.75) -> (66.08, 79.8586)
  line L36 (41.4499, 31.75) -> (-24.6201, 31.75)
  line L37 (-24.6201, 31.75) -> (-0.7863, 67.0424)
  line L38 (-0.7863, 67.0424) -> (41.4499, 31.75)
  line L39 (30.4064, 124.5777) -> (-2.1121, 76.4254)
  line L40 (-2.1121, 76.4254) -> (-17.5821, 89.3521)
  line L41 (-17.5821, 89.3521) -> (23.9296, 141.8953)
  arc A26 (23.9296, 141.8953) -> (30.4064, 124.5777) centre (44.45, 139.7) ccw
  line L42 (-21.5201, 84.3676) -> (-5.6845, 71.1354)
  line L43 (-5.6845, 71.1354) -> (-32.2825, 31.75)
  line L44 (-32.2825, 31.75) -> (-63.0905, 31.75)
  line L45 (-63.0905, 31.75) -> (-21.5201, 84.3676)
  point P0 (0, 0)
  dimension "d34" = 6.35
  dimension "d35" = 6.35
  dimension "d36" = 3.175
  dimension "d37" = 3.175
  dimension "d38" = 3.175
  dimension "d39" = 3.175
  dimension "d40" = 3.175
  dimension "d41" = 3.175
extrude "Extrusion2" cut sketch "Sketch3" against normal through all
fillet "Fillet2" radius 3.302 19 edges at (-21.5201, 84.3676, 3.175) (-63.0905, 31.75, 3.175) (-32.2825, 31.75, 3.175) (-5.6845, 71.1354, 3.175) (-0.7863, 67.0424, 3.175) (-24.6201, 31.75, 3.175) (41.4499, 31.75, 3.175) (30.4064, 124.5777, 3.175) (23.9296, 141.8953, 3.175) (-17.5821, 89.3521, 3.175) (-2.1121, 76.4254, 3.175) (66.08, 79.8586, 3.175) (5.8815, 69.7459, 3.175) (51.353, 31.75, 3.175) (69.3971, 31.75, 3.175) (65.6411, 86.2239, 3.175) (62.6277, 129.9287, 3.175) (35.6688, 121.0239, 3.175) (5.3247, 76.0913, 3.175)
equation "\"d34\" = off"
equation "\"d35\" = off"
equation "\"d36\" = 0.5 * off"
equation "\"d37\" = 0.5 * off"
equation "\"d38\" = 0.5 * off"
equation "\"d39\" = 0.5 * off"
equation "\"d40\" = 0.5 * off"
equation "\"d41\" = 0.5 * off"
equation "\"off\" = 6.35"
properties part number "CL3-004" material "Aluminum 6061"
